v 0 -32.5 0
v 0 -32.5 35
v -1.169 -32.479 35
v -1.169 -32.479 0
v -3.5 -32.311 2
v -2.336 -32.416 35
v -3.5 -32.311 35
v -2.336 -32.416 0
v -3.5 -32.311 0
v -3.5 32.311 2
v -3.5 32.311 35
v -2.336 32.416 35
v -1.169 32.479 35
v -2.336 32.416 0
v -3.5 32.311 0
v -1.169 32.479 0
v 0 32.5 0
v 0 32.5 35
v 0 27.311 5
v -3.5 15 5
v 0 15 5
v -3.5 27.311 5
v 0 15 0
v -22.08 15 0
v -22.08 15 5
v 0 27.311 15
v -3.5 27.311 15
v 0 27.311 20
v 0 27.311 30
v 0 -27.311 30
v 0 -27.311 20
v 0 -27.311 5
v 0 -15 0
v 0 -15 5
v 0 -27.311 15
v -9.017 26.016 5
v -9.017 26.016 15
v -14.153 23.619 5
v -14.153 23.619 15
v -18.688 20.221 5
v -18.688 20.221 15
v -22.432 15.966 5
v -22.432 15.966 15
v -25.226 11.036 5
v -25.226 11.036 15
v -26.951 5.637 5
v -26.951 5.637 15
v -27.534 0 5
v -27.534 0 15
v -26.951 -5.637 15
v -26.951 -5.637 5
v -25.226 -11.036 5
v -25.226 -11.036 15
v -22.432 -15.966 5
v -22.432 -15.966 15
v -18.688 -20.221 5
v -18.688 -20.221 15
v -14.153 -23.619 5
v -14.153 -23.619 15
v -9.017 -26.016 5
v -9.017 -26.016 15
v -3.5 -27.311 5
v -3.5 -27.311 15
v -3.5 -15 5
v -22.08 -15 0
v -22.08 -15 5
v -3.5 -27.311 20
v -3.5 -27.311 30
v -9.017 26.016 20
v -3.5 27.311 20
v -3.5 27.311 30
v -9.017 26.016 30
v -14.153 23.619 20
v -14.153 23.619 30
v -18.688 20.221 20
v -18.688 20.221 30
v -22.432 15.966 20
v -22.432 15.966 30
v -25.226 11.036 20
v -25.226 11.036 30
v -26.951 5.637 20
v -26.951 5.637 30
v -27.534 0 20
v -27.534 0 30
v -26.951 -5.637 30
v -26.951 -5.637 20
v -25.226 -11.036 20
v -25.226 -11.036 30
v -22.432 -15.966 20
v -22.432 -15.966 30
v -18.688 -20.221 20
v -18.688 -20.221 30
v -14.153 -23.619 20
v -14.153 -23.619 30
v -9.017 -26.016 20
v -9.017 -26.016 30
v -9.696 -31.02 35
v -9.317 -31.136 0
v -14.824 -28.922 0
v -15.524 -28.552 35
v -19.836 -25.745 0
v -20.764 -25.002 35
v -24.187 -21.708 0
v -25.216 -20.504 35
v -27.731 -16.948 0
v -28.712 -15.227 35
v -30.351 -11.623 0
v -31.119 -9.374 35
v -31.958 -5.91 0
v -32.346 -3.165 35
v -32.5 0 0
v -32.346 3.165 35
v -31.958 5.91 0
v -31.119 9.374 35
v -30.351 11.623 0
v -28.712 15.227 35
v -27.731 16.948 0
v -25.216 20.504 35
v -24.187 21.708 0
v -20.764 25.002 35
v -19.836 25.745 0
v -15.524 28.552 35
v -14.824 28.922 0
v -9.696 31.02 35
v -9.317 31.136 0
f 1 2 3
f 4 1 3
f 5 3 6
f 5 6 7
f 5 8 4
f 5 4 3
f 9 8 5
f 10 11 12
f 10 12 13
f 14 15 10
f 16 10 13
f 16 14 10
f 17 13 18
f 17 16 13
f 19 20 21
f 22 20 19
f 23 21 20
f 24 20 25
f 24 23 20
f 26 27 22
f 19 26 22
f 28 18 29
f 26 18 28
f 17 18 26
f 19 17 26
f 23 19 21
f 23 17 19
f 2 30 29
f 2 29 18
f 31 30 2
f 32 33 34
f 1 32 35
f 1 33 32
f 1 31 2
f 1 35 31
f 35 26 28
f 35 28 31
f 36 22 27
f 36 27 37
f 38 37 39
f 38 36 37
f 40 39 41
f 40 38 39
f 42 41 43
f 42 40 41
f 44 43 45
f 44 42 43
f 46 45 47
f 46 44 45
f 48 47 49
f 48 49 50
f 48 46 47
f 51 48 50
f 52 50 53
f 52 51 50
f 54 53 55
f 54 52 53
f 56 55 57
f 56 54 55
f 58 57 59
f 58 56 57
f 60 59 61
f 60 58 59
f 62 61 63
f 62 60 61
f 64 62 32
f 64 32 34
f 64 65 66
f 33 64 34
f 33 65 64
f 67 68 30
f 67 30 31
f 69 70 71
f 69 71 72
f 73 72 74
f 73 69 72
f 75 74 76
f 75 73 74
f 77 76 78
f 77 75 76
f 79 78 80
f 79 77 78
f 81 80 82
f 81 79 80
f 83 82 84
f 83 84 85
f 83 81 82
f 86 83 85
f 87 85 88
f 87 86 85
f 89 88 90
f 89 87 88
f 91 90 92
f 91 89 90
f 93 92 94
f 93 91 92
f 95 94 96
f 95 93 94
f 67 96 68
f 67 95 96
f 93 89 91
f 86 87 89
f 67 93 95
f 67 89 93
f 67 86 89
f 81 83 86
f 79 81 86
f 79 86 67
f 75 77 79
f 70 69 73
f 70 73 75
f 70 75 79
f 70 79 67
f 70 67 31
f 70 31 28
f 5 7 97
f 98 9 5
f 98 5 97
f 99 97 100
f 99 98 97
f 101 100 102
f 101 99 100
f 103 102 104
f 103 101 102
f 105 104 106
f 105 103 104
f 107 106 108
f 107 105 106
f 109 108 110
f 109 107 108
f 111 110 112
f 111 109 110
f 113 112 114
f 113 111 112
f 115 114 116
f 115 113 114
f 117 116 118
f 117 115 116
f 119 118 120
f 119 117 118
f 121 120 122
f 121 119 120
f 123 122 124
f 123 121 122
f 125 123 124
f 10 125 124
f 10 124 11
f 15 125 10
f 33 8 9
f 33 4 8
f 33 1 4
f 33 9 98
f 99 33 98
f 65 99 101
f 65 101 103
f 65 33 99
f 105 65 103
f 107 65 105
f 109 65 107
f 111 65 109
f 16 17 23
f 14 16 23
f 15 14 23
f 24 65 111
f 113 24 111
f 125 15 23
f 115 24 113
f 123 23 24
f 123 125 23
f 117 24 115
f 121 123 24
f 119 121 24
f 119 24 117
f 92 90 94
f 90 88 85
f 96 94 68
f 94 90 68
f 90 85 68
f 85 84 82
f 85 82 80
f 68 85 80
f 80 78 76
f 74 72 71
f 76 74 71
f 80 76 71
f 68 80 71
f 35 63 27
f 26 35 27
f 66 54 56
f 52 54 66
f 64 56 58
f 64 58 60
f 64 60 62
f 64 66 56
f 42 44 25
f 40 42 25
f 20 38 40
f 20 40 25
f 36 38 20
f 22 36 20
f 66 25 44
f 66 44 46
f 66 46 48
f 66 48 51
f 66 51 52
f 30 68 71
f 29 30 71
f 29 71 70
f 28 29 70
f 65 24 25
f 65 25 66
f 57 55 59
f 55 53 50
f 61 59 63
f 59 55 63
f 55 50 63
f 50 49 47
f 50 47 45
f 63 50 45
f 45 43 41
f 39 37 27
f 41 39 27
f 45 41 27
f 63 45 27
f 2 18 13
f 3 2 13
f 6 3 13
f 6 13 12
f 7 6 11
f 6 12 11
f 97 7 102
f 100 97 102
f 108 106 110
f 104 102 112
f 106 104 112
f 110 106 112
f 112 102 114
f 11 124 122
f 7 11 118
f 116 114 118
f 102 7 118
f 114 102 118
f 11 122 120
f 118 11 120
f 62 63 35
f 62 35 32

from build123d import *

# Parameters (mm, degrees)
BOSS_EXTRUDE3_DEPTH = 35
CUT_EXTRUDE2_START  = -5
CUT_EXTRUDE2_DEPTH  = 10
CUT_EXTRUDE3_START  = -20
CUT_EXTRUDE3_DEPTH  = 10
SKETCH5_R           = 32.5
BOSS_EXTRUDE6_DEPTH = 2
CUT_EXTRUDE4_START  = -2
CUT_EXTRUDE4_DEPTH  = 2
SKETCH8_R           = 2.5
CUT_EXTRUDE5_DEPTH  = 60.004237136
BOSS_EXTRUDE8_DEPTH = 35
SKETCH10_W          = 10
SKETCH10_H          = 54.621977686
CUT_EXTRUDE6_DEPTH  = 11.5
SKETCH8_4_R         = 2.5
CUT_EXTRUDE7_DEPTH  = 10
SKETCH13_R          = 35.016935796
CUT_EXTRUDE10_DEPTH = 2
SKETCH14_R          = 6
CUT_EXTRUDE11_DEPTH = 8
CUT_EXTRUDE12_DEPTH = 8


with BuildPart() as part:
    # Sketch1 → Boss-Extrude3 (new body)
    with BuildSketch(Plane.XY):
        with BuildLine():
            Line((-3.5, 32.310988843), (-3.5, -32.310988843))
            ThreePointArc((-3.5, -32.310988843), (-32.5, 0), (-3.5, 32.310988843))
        make_face()
    extrude(amount=BOSS_EXTRUDE3_DEPTH)

    # Sketch4 → Cut-Extrude2 (cut)
    with BuildSketch(Plane(origin=(0, 0, 0), x_dir=(-1, 0, 0), z_dir=(0, 0, -1)).offset(CUT_EXTRUDE2_START)):
        with BuildLine():
            Line((3.5, 0), (3.5, 27.310988843))
            ThreePointArc((3.5, 27.310988843), (27.534344219, 0), (3.5, -27.310988843))
            Line((3.5, -27.310988843), (3.5, 0))
        make_face()
    extrude(amount=-CUT_EXTRUDE2_DEPTH, mode=Mode.SUBTRACT)

    # Sketch4<9> → Cut-Extrude3 (cut)
    with BuildSketch(Plane(origin=(0, 0, 0), x_dir=(-1, 0, 0), z_dir=(0, 0, -1)).offset(CUT_EXTRUDE3_START)):
        with BuildLine():
            Line((3.5, 0), (3.5, 27.310988843))
            ThreePointArc((3.5, 27.310988843), (27.534344219, 0), (3.5, -27.310988843))
            Line((3.5, -27.310988843), (3.5, 0))
        make_face()
    extrude(amount=-CUT_EXTRUDE3_DEPTH, mode=Mode.SUBTRACT)

    # Sketch5 → Boss-Extrude6 (add, symmetric)
    with BuildSketch(Plane(origin=(0, 0, 0), x_dir=(-1, 0, 0), z_dir=(0, 0, -1))):
        Circle(SKETCH5_R)
    extrude(amount=BOSS_EXTRUDE6_DEPTH, both=True)

    # Sketch6 → Cut-Extrude4 (cut)
    with BuildSketch(Plane.XY.offset(2).offset(CUT_EXTRUDE4_START)):
        with BuildLine():
            Line((-3.5, 32.310988843), (-3.5, -32.310988843))
            ThreePointArc((-3.5, -32.310988843), (32.5, 0), (-3.5, 32.310988843))
        make_face()
    extrude(amount=CUT_EXTRUDE4_DEPTH, mode=Mode.SUBTRACT)

    # Sketch8 → Cut-Extrude5 (cut, through all)
    with BuildSketch(Plane(origin=(0, 0, -2), x_dir=(-1, 0, 0), z_dir=(0, 0, -1))):
        Circle(SKETCH8_R)
    extrude(amount=-CUT_EXTRUDE5_DEPTH, mode=Mode.SUBTRACT)

    # Sketch12 → Boss-Extrude8 (add)
    with BuildSketch(Plane.XY):
        with BuildLine():
            Line((0, 32.5), (0, -32.5))
            ThreePointArc((0, -32.5), (-1.752549943, -32.452712809), (-3.5, -32.310988843))
            Line((-3.5, -32.310988843), (-3.5, 32.310988843))
            ThreePointArc((-3.5, 32.310988843), (-1.752549943, 32.452712809), (0, 32.5))
        make_face()
    extrude(amount=BOSS_EXTRUDE8_DEPTH)

    # Sketch10 → Cut-Extrude6 (cut)
    with BuildSketch(Plane(origin=(-3.5, 0, 0), x_dir=(0, 0, -1), z_dir=(1, 0, 0))):
        with Locations((-10, 0)):
            Rectangle(SKETCH10_W, SKETCH10_H)
        with Locations((-25, 0)):
            Rectangle(SKETCH10_W, SKETCH10_H)
    extrude(amount=CUT_EXTRUDE6_DEPTH, mode=Mode.SUBTRACT)

    # Sketch8<4> → Cut-Extrude7 (cut)
    with BuildSketch(Plane(origin=(0, 0, -2), x_dir=(-1, 0, 0), z_dir=(0, 0, -1))):
        Circle(SKETCH8_4_R)
    extrude(amount=-CUT_EXTRUDE7_DEPTH, mode=Mode.SUBTRACT)

    # Sketch13 → Cut-Extrude10 (cut)
    with BuildSketch(Plane(origin=(0, 0, -2), x_dir=(-1, 0, 0), z_dir=(0, 0, -1))):
        Circle(SKETCH13_R)
    extrude(amount=-CUT_EXTRUDE10_DEPTH, mode=Mode.SUBTRACT)

    # Sketch14 → Cut-Extrude11 (cut)
    with BuildSketch(Plane(origin=(0, 0, 0), x_dir=(-1, 0, 0), z_dir=(0, 0, -1))):
        Circle(SKETCH14_R)
    extrude(amount=-CUT_EXTRUDE11_DEPTH, mode=Mode.SUBTRACT)

    # Sketch15 → Cut-Extrude12 (cut)
    with BuildSketch(Plane(origin=(0, 0, 0), x_dir=(-1, 0, 0), z_dir=(0, 0, -1))):
        Polygon((0, 0), (0, 15), (22.08, 15), (22.08, -15), (0, -15), align=None)
    extrude(amount=-CUT_EXTRUDE12_DEPTH, mode=Mode.SUBTRACT)


solid = part.part
